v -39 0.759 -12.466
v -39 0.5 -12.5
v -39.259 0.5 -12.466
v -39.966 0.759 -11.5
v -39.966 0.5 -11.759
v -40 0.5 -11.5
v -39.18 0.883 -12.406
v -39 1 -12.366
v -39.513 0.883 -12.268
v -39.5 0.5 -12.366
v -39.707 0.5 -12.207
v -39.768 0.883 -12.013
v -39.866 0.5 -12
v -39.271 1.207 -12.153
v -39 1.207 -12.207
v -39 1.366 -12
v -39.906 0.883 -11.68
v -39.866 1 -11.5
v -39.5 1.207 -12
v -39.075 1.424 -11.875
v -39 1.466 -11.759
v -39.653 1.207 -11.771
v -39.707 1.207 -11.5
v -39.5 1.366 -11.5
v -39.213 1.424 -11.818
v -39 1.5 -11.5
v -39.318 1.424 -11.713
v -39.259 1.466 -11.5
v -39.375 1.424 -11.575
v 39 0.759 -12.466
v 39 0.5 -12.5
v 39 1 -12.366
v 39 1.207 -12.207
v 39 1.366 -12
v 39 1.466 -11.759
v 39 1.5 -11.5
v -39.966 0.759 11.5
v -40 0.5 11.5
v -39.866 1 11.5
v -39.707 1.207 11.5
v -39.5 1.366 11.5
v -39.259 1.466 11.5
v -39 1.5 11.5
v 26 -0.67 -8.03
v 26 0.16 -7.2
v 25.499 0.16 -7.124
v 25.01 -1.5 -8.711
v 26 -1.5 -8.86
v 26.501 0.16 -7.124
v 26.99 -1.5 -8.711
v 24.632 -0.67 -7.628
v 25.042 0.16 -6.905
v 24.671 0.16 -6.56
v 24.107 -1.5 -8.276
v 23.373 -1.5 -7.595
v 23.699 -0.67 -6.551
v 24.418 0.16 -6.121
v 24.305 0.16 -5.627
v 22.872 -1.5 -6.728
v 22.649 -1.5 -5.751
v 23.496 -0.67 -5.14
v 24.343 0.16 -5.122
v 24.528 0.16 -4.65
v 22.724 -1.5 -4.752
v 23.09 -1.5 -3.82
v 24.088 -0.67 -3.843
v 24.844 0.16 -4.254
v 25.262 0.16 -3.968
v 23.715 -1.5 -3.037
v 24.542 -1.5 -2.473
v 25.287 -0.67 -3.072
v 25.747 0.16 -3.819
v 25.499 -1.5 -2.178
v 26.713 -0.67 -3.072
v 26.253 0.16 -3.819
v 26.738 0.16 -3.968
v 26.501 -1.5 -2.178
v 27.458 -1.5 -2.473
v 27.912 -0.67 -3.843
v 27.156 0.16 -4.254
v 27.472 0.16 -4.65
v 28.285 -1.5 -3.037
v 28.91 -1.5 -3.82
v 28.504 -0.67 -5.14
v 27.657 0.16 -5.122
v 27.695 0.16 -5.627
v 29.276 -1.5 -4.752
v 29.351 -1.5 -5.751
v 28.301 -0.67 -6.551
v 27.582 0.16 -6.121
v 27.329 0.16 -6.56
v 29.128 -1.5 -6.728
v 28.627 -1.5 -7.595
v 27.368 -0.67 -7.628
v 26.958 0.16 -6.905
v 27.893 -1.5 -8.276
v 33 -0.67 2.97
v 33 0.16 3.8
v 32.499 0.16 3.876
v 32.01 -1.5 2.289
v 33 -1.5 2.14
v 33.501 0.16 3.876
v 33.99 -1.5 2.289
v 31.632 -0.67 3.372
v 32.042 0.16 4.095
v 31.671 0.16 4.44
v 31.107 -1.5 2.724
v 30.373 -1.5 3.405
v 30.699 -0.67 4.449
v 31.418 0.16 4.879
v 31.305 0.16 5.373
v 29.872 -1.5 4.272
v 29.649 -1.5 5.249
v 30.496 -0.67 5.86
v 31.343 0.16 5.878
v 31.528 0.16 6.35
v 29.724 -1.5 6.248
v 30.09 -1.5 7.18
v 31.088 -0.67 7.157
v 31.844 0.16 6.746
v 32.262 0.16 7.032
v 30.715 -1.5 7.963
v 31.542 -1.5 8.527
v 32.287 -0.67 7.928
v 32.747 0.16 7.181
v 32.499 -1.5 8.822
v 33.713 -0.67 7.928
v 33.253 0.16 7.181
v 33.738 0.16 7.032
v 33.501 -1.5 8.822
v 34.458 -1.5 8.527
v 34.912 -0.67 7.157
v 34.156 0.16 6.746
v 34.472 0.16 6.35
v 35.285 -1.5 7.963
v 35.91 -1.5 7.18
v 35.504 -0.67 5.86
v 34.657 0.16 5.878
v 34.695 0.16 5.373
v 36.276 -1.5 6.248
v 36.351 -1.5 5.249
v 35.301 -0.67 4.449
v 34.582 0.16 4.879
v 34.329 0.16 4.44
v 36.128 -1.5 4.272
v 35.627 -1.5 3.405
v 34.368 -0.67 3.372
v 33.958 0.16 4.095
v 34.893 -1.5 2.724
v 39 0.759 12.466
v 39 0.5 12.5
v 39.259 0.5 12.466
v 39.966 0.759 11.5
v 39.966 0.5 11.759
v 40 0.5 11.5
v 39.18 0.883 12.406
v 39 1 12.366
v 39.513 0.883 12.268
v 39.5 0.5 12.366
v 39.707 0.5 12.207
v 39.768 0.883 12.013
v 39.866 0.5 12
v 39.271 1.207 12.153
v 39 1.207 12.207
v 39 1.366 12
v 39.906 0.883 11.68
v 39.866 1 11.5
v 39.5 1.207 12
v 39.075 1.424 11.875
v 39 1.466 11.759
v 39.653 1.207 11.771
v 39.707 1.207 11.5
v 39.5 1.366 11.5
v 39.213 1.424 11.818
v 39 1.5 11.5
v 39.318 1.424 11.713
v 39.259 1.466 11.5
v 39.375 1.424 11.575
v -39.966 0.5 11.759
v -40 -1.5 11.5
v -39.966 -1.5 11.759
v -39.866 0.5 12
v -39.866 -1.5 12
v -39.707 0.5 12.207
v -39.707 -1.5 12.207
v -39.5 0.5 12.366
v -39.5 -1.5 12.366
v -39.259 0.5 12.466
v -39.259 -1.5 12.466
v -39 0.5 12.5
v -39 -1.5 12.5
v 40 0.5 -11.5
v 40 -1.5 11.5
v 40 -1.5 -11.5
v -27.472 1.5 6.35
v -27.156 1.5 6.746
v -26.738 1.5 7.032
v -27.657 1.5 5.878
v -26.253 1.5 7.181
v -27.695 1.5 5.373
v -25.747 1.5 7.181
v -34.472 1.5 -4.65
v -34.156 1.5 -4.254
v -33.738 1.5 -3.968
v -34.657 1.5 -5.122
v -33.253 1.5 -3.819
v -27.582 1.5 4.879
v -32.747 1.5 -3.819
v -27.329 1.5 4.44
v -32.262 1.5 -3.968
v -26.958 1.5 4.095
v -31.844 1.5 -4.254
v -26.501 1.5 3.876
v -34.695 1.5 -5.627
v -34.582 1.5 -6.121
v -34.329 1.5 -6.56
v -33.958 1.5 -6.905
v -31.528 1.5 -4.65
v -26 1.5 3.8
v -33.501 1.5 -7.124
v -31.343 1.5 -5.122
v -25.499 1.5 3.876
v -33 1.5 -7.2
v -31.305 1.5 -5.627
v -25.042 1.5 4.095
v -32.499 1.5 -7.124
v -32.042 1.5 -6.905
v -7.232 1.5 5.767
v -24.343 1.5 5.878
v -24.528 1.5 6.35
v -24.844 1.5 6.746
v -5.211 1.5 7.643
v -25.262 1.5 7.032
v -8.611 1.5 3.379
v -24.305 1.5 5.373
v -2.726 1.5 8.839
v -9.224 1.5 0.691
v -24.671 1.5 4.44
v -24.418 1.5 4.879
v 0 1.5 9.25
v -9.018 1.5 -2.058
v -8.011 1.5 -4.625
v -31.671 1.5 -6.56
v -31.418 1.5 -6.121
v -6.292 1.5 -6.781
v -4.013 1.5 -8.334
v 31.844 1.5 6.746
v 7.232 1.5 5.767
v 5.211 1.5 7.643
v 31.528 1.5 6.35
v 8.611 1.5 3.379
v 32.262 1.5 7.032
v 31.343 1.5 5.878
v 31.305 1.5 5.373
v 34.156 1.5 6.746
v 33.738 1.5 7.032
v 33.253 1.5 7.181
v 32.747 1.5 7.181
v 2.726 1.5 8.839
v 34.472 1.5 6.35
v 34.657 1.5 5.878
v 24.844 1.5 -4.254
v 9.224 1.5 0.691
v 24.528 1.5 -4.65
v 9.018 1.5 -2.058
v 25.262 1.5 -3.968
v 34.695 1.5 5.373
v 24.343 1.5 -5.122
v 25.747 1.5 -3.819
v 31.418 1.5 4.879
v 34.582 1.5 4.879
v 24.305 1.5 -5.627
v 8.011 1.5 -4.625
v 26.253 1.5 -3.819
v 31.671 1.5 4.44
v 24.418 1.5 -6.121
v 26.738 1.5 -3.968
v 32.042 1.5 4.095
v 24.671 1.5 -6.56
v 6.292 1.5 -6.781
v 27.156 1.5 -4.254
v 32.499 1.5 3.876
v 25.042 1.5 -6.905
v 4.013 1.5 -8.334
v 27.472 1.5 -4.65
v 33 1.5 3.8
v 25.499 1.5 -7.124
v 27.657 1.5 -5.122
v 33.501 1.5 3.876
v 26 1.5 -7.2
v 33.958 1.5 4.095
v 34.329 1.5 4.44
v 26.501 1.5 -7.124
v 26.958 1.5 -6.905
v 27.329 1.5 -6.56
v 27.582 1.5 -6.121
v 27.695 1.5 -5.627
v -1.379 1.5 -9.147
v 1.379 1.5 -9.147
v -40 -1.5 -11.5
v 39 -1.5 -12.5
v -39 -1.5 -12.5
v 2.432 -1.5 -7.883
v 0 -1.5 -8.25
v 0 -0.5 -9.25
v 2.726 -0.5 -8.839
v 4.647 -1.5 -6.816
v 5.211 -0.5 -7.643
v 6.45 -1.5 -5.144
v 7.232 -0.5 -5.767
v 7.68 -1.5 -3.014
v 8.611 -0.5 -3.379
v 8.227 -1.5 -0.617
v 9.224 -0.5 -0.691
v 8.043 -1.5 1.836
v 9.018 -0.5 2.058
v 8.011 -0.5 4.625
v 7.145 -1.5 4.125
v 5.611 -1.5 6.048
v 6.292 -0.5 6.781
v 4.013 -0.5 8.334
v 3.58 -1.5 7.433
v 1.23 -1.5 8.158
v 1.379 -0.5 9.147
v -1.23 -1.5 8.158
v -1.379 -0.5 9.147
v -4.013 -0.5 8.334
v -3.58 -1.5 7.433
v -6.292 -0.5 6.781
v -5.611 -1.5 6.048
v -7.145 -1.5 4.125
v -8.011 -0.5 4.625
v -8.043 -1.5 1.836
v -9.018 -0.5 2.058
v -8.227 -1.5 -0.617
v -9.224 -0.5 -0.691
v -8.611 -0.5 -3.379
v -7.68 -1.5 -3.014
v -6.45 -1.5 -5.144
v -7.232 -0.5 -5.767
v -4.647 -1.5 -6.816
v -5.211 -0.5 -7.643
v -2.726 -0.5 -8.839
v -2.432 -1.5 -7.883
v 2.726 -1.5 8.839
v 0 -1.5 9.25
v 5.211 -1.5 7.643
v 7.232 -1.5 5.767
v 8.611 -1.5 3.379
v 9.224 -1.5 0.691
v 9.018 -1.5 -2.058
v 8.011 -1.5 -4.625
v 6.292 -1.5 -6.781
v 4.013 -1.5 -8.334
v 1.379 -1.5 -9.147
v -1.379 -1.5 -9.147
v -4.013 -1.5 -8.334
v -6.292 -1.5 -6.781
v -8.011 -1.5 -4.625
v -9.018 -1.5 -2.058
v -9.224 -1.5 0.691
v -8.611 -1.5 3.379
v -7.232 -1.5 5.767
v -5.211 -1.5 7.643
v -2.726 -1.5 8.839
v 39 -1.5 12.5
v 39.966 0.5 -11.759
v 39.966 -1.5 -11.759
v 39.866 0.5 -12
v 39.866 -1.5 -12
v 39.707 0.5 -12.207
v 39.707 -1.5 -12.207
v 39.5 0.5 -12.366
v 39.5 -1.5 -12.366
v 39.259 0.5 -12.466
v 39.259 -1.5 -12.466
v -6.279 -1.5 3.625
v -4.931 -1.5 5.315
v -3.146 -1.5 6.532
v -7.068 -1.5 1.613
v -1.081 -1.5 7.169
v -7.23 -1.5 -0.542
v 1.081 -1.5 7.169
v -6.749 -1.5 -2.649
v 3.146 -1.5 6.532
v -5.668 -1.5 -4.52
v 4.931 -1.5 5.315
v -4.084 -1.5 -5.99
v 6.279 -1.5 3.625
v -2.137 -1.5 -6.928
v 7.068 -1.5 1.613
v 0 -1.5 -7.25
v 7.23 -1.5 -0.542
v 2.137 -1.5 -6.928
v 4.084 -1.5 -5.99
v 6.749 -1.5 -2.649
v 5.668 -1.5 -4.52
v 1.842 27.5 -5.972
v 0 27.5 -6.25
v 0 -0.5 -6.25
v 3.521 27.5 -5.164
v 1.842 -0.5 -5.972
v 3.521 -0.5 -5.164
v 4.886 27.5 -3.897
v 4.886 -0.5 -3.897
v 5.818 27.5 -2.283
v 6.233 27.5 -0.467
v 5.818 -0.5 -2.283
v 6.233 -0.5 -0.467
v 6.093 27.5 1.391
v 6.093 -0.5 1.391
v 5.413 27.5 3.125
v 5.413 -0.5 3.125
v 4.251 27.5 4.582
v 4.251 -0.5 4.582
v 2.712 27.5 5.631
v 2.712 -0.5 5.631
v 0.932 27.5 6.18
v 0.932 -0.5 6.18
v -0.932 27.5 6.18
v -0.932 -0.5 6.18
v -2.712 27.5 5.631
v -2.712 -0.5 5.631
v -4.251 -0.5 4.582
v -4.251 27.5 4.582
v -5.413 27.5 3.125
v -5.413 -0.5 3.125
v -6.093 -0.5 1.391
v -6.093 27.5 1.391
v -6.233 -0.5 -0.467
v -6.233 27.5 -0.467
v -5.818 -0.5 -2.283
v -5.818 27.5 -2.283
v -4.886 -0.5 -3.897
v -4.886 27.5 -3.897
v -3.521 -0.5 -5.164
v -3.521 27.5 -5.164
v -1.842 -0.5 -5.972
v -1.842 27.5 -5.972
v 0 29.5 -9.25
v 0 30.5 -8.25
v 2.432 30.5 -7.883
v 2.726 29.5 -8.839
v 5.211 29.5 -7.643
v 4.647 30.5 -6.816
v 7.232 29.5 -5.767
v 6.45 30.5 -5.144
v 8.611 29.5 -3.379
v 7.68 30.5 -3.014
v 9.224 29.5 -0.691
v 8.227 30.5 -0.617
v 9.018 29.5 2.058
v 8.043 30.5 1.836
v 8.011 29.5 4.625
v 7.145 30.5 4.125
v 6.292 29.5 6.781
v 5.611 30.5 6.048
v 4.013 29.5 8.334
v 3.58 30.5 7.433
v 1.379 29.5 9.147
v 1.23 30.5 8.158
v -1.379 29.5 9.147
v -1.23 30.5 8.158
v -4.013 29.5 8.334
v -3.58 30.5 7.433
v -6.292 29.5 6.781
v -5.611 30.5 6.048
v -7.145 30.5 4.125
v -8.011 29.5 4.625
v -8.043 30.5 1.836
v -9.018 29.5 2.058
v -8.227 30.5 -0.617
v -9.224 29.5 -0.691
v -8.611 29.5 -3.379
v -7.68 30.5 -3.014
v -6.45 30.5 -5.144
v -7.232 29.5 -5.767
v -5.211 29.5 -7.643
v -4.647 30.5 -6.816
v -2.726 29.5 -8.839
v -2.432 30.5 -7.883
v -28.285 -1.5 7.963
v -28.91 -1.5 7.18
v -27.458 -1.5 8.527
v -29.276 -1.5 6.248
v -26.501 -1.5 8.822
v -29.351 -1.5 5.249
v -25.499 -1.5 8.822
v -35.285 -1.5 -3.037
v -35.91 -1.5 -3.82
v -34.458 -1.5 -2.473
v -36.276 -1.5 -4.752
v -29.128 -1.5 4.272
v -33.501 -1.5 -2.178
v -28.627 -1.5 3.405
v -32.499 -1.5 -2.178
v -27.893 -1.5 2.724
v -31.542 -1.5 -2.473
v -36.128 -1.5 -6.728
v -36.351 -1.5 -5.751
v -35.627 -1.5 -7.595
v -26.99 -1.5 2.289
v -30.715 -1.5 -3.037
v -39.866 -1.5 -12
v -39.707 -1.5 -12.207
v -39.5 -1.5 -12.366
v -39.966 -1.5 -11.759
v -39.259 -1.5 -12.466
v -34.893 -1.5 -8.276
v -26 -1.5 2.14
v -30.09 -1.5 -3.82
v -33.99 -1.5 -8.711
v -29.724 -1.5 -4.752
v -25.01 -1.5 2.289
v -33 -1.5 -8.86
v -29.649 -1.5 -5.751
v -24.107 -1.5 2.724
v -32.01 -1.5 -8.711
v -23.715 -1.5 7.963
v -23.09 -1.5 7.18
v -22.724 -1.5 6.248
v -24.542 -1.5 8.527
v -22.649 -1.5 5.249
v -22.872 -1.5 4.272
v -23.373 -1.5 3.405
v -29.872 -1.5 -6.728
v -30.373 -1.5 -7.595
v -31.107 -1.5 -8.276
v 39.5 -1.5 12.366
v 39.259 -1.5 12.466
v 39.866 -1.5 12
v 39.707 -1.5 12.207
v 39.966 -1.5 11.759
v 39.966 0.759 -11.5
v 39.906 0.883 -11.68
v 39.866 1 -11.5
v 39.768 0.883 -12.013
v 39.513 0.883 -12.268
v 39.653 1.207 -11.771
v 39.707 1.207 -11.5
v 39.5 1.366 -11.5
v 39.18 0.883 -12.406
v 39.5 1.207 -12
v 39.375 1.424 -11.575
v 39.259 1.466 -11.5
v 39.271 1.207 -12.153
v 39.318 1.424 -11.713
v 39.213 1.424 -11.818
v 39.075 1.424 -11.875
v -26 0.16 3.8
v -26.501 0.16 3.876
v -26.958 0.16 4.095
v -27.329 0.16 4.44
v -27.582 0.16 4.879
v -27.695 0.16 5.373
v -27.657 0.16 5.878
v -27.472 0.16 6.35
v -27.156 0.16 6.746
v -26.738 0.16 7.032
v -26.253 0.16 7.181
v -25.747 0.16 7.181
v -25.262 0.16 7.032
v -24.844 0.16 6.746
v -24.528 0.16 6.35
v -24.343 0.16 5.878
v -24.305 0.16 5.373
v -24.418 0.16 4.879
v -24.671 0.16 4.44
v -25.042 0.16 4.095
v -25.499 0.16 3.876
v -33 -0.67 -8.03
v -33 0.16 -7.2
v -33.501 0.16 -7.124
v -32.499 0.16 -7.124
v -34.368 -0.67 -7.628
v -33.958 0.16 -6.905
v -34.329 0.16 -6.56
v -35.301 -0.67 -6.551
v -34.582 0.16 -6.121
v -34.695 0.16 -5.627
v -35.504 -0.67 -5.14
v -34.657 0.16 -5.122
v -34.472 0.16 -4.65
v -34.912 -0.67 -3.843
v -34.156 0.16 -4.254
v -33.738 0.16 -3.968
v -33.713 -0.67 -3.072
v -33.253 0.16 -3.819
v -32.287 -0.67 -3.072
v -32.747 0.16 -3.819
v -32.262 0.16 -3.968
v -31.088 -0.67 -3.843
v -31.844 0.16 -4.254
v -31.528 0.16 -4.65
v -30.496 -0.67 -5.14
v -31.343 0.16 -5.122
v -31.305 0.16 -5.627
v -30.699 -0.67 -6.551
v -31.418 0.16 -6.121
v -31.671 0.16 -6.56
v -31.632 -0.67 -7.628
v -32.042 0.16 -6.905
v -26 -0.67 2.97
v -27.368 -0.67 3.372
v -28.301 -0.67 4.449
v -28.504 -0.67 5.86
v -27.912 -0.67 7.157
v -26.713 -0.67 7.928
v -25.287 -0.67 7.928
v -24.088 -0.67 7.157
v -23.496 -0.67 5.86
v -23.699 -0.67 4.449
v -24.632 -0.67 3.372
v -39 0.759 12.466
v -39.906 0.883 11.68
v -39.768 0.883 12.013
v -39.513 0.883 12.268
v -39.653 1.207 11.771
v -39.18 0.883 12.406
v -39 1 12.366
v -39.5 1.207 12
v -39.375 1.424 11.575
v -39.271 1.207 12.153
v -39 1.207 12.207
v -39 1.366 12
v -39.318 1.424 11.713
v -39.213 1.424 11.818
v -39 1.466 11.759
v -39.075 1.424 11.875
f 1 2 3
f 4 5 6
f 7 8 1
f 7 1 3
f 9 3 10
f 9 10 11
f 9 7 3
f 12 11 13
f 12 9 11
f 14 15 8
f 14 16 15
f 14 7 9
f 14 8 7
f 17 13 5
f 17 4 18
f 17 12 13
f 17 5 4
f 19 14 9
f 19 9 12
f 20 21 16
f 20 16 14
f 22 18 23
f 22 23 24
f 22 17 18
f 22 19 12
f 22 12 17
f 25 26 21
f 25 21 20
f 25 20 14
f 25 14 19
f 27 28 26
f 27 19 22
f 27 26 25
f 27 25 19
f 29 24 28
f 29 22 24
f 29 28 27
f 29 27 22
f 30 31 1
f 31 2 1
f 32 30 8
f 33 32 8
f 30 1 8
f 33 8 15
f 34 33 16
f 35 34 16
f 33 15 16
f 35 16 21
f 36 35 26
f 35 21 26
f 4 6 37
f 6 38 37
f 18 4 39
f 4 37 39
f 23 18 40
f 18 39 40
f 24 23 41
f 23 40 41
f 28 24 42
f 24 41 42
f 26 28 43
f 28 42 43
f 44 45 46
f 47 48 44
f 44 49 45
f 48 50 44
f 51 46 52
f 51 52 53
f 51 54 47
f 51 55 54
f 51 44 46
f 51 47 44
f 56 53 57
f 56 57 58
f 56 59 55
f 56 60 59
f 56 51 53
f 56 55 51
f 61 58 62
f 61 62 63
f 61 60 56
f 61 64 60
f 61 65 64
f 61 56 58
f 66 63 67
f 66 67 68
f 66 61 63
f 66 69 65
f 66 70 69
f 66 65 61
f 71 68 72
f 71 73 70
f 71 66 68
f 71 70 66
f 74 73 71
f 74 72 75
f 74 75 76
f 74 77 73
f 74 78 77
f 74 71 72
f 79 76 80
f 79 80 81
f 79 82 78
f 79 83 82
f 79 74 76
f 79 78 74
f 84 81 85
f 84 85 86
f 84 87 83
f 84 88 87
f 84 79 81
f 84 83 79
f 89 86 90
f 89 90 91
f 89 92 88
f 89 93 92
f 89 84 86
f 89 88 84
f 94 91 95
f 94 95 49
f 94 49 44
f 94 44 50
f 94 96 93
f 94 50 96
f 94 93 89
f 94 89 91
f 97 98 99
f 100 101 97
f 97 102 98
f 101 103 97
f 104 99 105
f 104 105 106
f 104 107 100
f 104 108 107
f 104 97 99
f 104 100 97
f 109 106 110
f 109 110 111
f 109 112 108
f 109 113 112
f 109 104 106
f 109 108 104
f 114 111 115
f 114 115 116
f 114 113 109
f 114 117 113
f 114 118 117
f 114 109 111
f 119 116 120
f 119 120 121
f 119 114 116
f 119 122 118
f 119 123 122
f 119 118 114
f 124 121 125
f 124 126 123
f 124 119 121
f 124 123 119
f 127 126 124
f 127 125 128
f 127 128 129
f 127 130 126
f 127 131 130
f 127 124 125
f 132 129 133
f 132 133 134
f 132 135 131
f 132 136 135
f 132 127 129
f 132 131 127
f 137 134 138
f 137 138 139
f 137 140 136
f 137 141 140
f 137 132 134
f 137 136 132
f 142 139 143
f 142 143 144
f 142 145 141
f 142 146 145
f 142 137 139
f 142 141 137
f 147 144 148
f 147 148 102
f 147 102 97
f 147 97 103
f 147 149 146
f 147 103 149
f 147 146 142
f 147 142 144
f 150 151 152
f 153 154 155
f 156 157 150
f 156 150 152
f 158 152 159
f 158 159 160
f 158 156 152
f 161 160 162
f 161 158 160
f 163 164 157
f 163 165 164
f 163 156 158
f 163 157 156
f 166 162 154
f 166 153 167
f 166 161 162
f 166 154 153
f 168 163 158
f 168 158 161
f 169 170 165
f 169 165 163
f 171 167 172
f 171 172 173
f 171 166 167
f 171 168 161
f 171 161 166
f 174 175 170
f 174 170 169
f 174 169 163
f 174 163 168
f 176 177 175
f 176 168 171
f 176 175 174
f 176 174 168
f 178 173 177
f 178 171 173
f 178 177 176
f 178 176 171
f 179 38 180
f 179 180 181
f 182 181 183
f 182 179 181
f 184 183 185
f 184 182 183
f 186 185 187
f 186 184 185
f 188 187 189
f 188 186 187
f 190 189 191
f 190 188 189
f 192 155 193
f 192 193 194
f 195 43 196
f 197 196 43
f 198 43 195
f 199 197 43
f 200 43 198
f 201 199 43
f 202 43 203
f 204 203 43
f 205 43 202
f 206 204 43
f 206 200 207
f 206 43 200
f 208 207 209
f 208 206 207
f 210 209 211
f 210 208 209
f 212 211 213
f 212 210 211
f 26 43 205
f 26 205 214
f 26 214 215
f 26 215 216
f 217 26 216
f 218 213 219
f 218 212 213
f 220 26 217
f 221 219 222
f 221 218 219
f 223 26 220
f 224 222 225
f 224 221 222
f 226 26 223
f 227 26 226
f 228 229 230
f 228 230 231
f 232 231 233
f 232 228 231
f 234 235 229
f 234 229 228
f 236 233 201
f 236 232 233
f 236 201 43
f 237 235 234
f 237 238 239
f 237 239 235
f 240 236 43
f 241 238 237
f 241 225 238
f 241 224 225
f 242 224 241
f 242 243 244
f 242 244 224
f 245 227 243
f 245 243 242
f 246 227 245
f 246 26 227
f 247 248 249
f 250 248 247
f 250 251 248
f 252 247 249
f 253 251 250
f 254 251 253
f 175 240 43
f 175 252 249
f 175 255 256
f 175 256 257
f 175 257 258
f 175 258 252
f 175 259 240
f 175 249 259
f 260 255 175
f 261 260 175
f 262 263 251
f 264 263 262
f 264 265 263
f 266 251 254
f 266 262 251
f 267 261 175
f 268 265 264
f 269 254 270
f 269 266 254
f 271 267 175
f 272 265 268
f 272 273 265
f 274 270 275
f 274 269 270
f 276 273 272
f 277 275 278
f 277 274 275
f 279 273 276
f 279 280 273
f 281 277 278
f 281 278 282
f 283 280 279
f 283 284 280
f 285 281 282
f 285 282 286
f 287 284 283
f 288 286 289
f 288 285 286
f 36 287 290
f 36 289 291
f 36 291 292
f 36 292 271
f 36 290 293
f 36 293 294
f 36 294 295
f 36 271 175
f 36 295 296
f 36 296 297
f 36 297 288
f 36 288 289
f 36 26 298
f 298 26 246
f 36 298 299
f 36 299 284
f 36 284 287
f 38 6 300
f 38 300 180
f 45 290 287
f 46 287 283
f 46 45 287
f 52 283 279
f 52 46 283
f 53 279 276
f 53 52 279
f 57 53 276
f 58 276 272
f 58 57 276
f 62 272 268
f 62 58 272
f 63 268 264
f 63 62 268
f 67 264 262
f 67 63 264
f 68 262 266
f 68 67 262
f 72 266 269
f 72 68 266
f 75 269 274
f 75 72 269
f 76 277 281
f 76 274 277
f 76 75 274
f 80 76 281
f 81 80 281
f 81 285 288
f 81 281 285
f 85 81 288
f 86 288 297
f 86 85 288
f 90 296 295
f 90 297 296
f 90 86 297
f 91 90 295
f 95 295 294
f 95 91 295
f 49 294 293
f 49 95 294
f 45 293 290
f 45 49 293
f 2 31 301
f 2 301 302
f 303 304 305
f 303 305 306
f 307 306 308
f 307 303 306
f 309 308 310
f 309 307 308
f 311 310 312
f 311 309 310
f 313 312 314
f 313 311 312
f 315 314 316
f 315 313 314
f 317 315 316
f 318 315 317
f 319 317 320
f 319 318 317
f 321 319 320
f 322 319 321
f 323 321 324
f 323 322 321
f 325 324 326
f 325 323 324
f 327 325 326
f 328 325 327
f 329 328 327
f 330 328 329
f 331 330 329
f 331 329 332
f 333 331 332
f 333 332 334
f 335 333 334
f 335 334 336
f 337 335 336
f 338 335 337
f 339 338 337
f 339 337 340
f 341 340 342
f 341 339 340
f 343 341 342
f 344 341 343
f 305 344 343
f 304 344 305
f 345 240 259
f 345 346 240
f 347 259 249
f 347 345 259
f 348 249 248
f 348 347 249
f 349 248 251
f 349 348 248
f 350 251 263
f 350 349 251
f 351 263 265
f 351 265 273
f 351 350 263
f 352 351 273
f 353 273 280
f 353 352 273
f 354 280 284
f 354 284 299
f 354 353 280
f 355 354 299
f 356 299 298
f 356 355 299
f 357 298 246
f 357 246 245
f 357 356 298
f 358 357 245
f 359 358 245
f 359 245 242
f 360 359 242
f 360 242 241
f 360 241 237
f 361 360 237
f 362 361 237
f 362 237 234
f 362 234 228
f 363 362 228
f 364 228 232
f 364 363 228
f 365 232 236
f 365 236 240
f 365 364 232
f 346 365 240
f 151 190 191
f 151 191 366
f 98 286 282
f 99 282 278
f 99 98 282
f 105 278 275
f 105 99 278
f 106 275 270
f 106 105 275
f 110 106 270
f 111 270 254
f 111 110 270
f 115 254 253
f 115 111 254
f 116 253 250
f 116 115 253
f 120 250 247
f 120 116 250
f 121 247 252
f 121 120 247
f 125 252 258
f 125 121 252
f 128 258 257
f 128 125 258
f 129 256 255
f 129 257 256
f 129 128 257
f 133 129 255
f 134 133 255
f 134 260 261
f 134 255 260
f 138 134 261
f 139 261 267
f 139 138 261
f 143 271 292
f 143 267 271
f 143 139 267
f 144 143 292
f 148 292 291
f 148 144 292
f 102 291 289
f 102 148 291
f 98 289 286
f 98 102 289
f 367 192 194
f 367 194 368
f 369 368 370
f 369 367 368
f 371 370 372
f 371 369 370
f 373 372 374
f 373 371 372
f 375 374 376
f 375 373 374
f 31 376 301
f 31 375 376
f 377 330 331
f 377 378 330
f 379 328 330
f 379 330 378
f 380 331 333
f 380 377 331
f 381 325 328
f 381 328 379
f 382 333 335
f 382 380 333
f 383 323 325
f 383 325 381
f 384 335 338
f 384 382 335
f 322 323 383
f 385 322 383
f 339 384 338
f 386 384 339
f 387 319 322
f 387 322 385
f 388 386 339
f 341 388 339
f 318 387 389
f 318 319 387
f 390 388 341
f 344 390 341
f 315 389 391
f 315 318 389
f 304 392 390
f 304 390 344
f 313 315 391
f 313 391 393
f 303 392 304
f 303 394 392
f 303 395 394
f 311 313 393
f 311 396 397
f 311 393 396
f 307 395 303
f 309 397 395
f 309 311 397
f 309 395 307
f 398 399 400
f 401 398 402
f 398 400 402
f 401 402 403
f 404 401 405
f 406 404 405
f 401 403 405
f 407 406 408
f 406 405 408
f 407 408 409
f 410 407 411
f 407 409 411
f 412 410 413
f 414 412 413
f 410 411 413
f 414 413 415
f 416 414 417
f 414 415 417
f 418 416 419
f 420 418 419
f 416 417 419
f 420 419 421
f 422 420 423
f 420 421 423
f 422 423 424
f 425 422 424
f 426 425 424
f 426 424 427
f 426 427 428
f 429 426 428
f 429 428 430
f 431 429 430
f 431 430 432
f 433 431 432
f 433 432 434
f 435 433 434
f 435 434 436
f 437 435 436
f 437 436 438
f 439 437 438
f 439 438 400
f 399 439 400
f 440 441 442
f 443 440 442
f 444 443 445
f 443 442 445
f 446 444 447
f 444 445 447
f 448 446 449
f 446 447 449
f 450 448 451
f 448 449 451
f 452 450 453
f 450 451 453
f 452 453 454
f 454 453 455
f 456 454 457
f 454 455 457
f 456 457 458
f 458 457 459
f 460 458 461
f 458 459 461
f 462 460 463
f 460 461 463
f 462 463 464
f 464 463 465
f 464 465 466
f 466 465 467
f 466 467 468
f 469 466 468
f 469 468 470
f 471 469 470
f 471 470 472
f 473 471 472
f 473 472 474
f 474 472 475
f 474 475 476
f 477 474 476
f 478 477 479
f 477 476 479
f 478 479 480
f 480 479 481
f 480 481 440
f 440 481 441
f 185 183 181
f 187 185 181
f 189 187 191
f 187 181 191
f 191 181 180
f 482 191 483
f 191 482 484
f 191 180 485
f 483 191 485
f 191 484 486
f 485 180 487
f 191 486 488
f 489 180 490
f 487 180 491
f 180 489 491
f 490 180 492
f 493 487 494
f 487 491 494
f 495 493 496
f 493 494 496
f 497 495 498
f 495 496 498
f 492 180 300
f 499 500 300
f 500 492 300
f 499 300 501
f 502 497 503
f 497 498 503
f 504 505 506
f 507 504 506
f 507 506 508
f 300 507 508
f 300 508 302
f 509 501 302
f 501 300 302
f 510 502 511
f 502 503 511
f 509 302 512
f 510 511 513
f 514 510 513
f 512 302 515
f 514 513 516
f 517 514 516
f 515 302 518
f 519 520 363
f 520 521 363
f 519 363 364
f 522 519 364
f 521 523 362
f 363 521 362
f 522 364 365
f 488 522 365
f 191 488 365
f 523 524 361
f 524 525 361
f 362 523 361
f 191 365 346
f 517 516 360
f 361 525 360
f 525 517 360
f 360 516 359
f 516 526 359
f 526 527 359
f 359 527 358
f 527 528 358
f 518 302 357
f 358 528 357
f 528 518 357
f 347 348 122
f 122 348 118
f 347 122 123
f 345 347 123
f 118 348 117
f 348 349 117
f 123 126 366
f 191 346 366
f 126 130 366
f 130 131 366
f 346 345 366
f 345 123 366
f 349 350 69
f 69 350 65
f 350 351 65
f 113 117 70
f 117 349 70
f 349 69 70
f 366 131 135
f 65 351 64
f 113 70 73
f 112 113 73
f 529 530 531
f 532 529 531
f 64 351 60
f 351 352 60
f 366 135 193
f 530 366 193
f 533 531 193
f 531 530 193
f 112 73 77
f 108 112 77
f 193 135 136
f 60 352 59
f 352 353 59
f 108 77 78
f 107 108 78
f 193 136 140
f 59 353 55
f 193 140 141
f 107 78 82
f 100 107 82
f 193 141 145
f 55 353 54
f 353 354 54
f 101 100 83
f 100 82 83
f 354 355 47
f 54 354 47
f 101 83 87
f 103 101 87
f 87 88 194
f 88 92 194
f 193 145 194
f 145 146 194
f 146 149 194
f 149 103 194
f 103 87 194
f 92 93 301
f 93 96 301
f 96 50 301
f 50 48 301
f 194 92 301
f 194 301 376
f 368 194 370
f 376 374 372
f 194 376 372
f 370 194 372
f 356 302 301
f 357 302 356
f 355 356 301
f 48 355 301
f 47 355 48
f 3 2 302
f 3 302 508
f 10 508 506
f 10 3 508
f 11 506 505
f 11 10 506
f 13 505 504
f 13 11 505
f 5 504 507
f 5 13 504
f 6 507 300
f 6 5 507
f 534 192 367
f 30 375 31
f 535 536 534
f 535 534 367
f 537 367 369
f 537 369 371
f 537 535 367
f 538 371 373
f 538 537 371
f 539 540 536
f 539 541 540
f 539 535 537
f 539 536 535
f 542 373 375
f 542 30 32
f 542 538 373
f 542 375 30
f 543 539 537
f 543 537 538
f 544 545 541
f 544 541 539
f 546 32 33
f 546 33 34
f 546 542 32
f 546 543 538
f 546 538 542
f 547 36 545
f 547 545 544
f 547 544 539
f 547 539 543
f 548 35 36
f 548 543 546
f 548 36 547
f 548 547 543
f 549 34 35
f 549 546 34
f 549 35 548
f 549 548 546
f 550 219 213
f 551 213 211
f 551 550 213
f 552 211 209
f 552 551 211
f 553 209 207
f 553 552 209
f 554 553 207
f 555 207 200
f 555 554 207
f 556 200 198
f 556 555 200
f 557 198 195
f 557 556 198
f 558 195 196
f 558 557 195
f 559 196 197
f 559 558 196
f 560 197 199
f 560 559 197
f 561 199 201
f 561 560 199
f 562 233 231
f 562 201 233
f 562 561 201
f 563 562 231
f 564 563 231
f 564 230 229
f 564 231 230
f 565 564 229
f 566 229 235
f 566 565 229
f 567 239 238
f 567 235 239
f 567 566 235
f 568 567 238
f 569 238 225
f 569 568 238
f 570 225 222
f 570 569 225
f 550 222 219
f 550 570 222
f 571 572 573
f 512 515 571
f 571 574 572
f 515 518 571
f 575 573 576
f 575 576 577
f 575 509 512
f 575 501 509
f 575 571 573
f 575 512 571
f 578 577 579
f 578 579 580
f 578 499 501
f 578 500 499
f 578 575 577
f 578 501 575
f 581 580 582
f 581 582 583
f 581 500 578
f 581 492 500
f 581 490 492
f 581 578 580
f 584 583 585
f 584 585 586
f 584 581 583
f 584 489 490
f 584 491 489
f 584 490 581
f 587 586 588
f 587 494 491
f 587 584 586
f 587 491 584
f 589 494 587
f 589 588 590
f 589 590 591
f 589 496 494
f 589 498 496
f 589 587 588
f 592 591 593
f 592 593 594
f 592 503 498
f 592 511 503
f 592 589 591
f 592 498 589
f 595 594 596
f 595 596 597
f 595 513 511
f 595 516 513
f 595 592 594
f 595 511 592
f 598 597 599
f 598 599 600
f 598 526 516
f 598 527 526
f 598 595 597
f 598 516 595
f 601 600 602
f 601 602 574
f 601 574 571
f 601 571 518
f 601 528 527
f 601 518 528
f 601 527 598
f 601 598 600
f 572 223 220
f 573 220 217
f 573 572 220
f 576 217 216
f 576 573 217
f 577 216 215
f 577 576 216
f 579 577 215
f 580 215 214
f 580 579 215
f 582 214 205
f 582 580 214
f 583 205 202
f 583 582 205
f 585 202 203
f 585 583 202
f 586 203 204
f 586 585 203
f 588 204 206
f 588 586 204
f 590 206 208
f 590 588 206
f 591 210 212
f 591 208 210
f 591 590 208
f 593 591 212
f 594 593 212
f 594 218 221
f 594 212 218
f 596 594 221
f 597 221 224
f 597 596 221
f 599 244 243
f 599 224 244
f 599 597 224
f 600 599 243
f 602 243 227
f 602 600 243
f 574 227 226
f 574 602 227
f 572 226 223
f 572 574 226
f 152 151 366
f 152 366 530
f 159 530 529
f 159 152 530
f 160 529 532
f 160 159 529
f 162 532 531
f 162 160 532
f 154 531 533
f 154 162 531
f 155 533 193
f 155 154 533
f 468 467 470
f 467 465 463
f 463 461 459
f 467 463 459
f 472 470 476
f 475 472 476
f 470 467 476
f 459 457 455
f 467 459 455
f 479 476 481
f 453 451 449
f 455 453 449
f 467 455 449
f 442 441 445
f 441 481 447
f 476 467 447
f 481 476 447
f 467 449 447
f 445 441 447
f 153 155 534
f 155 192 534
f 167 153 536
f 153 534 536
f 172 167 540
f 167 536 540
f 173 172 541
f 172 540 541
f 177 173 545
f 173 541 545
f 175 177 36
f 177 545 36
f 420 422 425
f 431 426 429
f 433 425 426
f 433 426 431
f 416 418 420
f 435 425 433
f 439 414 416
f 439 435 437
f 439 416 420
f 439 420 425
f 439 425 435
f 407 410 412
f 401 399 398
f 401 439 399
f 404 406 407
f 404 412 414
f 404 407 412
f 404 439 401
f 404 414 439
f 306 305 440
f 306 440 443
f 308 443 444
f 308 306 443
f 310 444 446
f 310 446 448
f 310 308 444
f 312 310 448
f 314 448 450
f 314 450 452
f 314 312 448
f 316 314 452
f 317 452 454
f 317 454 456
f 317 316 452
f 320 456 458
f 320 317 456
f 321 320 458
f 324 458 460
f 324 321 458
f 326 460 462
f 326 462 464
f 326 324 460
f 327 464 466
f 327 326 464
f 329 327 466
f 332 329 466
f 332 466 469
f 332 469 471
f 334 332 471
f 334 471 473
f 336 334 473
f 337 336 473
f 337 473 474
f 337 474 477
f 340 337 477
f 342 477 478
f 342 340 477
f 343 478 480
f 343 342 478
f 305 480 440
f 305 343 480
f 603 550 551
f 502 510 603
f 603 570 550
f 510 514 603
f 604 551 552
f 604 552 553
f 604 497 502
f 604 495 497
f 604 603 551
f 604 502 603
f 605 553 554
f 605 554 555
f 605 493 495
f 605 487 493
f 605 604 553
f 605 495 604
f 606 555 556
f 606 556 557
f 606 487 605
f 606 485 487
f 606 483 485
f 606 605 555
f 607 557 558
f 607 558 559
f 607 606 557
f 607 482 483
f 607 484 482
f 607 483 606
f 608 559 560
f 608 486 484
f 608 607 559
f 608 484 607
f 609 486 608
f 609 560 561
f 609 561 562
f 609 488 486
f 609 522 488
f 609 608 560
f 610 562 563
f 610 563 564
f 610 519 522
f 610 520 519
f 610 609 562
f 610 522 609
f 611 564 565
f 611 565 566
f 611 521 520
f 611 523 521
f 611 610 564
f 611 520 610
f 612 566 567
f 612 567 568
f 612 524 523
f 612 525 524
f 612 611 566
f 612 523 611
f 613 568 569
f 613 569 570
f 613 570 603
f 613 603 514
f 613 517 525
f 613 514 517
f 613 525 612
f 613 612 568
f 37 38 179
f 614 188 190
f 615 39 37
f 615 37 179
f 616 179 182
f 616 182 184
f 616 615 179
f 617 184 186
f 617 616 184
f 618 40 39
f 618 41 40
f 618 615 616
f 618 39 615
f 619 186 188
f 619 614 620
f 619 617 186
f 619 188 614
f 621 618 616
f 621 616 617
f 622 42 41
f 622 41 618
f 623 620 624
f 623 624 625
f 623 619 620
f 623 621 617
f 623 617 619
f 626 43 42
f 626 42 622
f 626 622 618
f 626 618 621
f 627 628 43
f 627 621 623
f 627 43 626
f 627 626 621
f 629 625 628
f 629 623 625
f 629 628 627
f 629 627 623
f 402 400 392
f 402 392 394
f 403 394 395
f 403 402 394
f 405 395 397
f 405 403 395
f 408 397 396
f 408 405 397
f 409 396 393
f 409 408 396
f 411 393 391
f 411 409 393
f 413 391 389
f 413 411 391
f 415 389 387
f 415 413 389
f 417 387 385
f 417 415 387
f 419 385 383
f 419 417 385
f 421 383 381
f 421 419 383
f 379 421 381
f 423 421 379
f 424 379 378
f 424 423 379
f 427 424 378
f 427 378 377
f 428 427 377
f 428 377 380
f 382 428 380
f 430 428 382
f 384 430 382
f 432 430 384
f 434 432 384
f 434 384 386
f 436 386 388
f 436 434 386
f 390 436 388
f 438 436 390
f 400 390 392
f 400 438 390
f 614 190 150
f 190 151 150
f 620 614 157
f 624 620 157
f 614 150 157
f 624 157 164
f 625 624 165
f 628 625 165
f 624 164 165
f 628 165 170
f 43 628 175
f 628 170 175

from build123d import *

# Parameters (mm, degrees)
ESBO_O1_R                           = 9.25
RESSALTO_EXTRUS_O1_DEPTH            = 1.5
ESBO_O3_R                           = 9.25
RESSALTO_EXTRUS_O3_DEPTH            = 32
CASCA1_T                            = -3
CHANFRO1_SIZE                       = 1
FILETE1_R                           = 1
CHANFRO2_SIZE                       = 1
ESCAREADO_PARA_SFHCS_M31_AT_2_COUNT = 2
ESCAREADO_PARA_SFHCS_M31_AT_2_PITCH = 13.03840481
ESCAREADO_PARA_SFHCS_M31_AT_3_COUNT = 2
ESCAREADO_PARA_SFHCS_M31_AT_3_PITCH = 53.150729064
ESCAREADO_PARA_SFHCS_M31_AT_4_COUNT = 2
ESCAREADO_PARA_SFHCS_M31_AT_4_PITCH = 59


with BuildPart() as part:
    # Esboço1 → Ressalto-extrusão1 (new, symmetric)
    with BuildSketch(Plane(origin=(0, 0, 0), x_dir=(1, 0, 0), z_dir=(0, 1, 0))):
        with BuildLine():
            Line((-39, -12.5), (39, -12.5))
            ThreePointArc((39, -12.5), (39.707106781, -12.207106781), (40, -11.5))
            Line((40, -11.5), (40, 11.5))
            ThreePointArc((40, 11.5), (39.707106781, 12.207106781), (39, 12.5))
            Line((39, 12.5), (-39, 12.5))
            ThreePointArc((-39, 12.5), (-39.707106781, 12.207106781), (-40, 11.5))
            Line((-40, 11.5), (-40, -11.5))
            ThreePointArc((-40, -11.5), (-39.707106781, -12.207106781), (-39, -12.5))
        make_face()
        with Locations(Location((0, 0, 0), (0, 0, 270))):
            Circle(ESBO_O1_R, mode=Mode.SUBTRACT)
    extrude(amount=RESSALTO_EXTRUS_O1_DEPTH, both=True)

    # Filete1
    filete1_edges = [part.edges().sort_by_distance(p)[0] for p in [
        (39.707106781, 1.5, -12.207106781),
        (0, 1.5, -12.5),
        (-39.707106781, 1.5, -12.207106781),
        (-40, 1.5, 0),
        (-39.707106781, 1.5, 12.207106781),
        (0, 1.5, 12.5),
        (39.707106781, 1.5, 12.207106781),
        (40, 1.5, 0),
    ]]
    fillet(filete1_edges, radius=FILETE1_R)

    # Esboço6 → Escareado para SFHCS M31 (revolve, cut)
    with BuildSketch(Plane(origin=(26, -1.5, -5.5), x_dir=(0, 0, -1), z_dir=(1, 0, 0))):
        Polygon((0, 0), (0, 32), (1.7, 32), (1.7, 1.66), (3.36, 0), align=None)
    escareado_para_sfhcs_m31 = revolve(axis=Axis((26, -7.85, -5.5), (0, 1, 0)), mode=Mode.SUBTRACT)

    # Escareado para SFHCS M31 at 2: Escareado para SFHCS M31 ×2
    with Locations(*[Vector(0.536875492193159, 0, 0.8436614877321077) * (i * ESCAREADO_PARA_SFHCS_M31_AT_2_PITCH) for i in range(1, ESCAREADO_PARA_SFHCS_M31_AT_2_COUNT)]):
        add(escareado_para_sfhcs_m31, mode=Mode.SUBTRACT)

    # Escareado para SFHCS M31 at 3: Escareado para SFHCS M31 ×2
    with Locations(*[Vector(-0.9783497031189412, 0, 0.20695859104439146) * (i * ESCAREADO_PARA_SFHCS_M31_AT_3_PITCH) for i in range(1, ESCAREADO_PARA_SFHCS_M31_AT_3_COUNT)]):
        add(escareado_para_sfhcs_m31, mode=Mode.SUBTRACT)

    # Escareado para SFHCS M31 at 4: Escareado para SFHCS M31 ×2
    with Locations(*[(-i * ESCAREADO_PARA_SFHCS_M31_AT_4_PITCH, 0, 0) for i in range(1, ESCAREADO_PARA_SFHCS_M31_AT_4_COUNT)]):
        add(escareado_para_sfhcs_m31, mode=Mode.SUBTRACT)


with BuildPart() as body_2:
    # Esboço3 → Ressalto-extrusão3 (new body)
    with BuildSketch(Plane.XZ.offset(1.5)):
        with Locations(Location((0, 0, 0), (0, 0, 270))):
            Circle(ESBO_O3_R)
    extrude(amount=-RESSALTO_EXTRUS_O3_DEPTH)

    # Casca1
    casca1_openings = [body_2.faces().sort_by_distance(p)[0] for p in [
        (0, -1.5, 0),
    ]]
    offset(amount=CASCA1_T, openings=casca1_openings, kind=Kind.INTERSECTION)

    # Chanfro1
    chanfro1_edges = [body_2.edges().sort_by_distance(p)[0] for p in [
        (0, 30.5, 9.25),
    ]]
    chamfer(chanfro1_edges, length=CHANFRO1_SIZE)

    # Chanfro2
    chanfro2_edges = [body_2.edges().sort_by_distance(p)[0] for p in [
        (0, -1.5, 9.25),
        (0, -1.5, 6.25),
    ]]
    chamfer(chanfro2_edges, length=CHANFRO2_SIZE)


solid = Compound([part.part, body_2.part])
